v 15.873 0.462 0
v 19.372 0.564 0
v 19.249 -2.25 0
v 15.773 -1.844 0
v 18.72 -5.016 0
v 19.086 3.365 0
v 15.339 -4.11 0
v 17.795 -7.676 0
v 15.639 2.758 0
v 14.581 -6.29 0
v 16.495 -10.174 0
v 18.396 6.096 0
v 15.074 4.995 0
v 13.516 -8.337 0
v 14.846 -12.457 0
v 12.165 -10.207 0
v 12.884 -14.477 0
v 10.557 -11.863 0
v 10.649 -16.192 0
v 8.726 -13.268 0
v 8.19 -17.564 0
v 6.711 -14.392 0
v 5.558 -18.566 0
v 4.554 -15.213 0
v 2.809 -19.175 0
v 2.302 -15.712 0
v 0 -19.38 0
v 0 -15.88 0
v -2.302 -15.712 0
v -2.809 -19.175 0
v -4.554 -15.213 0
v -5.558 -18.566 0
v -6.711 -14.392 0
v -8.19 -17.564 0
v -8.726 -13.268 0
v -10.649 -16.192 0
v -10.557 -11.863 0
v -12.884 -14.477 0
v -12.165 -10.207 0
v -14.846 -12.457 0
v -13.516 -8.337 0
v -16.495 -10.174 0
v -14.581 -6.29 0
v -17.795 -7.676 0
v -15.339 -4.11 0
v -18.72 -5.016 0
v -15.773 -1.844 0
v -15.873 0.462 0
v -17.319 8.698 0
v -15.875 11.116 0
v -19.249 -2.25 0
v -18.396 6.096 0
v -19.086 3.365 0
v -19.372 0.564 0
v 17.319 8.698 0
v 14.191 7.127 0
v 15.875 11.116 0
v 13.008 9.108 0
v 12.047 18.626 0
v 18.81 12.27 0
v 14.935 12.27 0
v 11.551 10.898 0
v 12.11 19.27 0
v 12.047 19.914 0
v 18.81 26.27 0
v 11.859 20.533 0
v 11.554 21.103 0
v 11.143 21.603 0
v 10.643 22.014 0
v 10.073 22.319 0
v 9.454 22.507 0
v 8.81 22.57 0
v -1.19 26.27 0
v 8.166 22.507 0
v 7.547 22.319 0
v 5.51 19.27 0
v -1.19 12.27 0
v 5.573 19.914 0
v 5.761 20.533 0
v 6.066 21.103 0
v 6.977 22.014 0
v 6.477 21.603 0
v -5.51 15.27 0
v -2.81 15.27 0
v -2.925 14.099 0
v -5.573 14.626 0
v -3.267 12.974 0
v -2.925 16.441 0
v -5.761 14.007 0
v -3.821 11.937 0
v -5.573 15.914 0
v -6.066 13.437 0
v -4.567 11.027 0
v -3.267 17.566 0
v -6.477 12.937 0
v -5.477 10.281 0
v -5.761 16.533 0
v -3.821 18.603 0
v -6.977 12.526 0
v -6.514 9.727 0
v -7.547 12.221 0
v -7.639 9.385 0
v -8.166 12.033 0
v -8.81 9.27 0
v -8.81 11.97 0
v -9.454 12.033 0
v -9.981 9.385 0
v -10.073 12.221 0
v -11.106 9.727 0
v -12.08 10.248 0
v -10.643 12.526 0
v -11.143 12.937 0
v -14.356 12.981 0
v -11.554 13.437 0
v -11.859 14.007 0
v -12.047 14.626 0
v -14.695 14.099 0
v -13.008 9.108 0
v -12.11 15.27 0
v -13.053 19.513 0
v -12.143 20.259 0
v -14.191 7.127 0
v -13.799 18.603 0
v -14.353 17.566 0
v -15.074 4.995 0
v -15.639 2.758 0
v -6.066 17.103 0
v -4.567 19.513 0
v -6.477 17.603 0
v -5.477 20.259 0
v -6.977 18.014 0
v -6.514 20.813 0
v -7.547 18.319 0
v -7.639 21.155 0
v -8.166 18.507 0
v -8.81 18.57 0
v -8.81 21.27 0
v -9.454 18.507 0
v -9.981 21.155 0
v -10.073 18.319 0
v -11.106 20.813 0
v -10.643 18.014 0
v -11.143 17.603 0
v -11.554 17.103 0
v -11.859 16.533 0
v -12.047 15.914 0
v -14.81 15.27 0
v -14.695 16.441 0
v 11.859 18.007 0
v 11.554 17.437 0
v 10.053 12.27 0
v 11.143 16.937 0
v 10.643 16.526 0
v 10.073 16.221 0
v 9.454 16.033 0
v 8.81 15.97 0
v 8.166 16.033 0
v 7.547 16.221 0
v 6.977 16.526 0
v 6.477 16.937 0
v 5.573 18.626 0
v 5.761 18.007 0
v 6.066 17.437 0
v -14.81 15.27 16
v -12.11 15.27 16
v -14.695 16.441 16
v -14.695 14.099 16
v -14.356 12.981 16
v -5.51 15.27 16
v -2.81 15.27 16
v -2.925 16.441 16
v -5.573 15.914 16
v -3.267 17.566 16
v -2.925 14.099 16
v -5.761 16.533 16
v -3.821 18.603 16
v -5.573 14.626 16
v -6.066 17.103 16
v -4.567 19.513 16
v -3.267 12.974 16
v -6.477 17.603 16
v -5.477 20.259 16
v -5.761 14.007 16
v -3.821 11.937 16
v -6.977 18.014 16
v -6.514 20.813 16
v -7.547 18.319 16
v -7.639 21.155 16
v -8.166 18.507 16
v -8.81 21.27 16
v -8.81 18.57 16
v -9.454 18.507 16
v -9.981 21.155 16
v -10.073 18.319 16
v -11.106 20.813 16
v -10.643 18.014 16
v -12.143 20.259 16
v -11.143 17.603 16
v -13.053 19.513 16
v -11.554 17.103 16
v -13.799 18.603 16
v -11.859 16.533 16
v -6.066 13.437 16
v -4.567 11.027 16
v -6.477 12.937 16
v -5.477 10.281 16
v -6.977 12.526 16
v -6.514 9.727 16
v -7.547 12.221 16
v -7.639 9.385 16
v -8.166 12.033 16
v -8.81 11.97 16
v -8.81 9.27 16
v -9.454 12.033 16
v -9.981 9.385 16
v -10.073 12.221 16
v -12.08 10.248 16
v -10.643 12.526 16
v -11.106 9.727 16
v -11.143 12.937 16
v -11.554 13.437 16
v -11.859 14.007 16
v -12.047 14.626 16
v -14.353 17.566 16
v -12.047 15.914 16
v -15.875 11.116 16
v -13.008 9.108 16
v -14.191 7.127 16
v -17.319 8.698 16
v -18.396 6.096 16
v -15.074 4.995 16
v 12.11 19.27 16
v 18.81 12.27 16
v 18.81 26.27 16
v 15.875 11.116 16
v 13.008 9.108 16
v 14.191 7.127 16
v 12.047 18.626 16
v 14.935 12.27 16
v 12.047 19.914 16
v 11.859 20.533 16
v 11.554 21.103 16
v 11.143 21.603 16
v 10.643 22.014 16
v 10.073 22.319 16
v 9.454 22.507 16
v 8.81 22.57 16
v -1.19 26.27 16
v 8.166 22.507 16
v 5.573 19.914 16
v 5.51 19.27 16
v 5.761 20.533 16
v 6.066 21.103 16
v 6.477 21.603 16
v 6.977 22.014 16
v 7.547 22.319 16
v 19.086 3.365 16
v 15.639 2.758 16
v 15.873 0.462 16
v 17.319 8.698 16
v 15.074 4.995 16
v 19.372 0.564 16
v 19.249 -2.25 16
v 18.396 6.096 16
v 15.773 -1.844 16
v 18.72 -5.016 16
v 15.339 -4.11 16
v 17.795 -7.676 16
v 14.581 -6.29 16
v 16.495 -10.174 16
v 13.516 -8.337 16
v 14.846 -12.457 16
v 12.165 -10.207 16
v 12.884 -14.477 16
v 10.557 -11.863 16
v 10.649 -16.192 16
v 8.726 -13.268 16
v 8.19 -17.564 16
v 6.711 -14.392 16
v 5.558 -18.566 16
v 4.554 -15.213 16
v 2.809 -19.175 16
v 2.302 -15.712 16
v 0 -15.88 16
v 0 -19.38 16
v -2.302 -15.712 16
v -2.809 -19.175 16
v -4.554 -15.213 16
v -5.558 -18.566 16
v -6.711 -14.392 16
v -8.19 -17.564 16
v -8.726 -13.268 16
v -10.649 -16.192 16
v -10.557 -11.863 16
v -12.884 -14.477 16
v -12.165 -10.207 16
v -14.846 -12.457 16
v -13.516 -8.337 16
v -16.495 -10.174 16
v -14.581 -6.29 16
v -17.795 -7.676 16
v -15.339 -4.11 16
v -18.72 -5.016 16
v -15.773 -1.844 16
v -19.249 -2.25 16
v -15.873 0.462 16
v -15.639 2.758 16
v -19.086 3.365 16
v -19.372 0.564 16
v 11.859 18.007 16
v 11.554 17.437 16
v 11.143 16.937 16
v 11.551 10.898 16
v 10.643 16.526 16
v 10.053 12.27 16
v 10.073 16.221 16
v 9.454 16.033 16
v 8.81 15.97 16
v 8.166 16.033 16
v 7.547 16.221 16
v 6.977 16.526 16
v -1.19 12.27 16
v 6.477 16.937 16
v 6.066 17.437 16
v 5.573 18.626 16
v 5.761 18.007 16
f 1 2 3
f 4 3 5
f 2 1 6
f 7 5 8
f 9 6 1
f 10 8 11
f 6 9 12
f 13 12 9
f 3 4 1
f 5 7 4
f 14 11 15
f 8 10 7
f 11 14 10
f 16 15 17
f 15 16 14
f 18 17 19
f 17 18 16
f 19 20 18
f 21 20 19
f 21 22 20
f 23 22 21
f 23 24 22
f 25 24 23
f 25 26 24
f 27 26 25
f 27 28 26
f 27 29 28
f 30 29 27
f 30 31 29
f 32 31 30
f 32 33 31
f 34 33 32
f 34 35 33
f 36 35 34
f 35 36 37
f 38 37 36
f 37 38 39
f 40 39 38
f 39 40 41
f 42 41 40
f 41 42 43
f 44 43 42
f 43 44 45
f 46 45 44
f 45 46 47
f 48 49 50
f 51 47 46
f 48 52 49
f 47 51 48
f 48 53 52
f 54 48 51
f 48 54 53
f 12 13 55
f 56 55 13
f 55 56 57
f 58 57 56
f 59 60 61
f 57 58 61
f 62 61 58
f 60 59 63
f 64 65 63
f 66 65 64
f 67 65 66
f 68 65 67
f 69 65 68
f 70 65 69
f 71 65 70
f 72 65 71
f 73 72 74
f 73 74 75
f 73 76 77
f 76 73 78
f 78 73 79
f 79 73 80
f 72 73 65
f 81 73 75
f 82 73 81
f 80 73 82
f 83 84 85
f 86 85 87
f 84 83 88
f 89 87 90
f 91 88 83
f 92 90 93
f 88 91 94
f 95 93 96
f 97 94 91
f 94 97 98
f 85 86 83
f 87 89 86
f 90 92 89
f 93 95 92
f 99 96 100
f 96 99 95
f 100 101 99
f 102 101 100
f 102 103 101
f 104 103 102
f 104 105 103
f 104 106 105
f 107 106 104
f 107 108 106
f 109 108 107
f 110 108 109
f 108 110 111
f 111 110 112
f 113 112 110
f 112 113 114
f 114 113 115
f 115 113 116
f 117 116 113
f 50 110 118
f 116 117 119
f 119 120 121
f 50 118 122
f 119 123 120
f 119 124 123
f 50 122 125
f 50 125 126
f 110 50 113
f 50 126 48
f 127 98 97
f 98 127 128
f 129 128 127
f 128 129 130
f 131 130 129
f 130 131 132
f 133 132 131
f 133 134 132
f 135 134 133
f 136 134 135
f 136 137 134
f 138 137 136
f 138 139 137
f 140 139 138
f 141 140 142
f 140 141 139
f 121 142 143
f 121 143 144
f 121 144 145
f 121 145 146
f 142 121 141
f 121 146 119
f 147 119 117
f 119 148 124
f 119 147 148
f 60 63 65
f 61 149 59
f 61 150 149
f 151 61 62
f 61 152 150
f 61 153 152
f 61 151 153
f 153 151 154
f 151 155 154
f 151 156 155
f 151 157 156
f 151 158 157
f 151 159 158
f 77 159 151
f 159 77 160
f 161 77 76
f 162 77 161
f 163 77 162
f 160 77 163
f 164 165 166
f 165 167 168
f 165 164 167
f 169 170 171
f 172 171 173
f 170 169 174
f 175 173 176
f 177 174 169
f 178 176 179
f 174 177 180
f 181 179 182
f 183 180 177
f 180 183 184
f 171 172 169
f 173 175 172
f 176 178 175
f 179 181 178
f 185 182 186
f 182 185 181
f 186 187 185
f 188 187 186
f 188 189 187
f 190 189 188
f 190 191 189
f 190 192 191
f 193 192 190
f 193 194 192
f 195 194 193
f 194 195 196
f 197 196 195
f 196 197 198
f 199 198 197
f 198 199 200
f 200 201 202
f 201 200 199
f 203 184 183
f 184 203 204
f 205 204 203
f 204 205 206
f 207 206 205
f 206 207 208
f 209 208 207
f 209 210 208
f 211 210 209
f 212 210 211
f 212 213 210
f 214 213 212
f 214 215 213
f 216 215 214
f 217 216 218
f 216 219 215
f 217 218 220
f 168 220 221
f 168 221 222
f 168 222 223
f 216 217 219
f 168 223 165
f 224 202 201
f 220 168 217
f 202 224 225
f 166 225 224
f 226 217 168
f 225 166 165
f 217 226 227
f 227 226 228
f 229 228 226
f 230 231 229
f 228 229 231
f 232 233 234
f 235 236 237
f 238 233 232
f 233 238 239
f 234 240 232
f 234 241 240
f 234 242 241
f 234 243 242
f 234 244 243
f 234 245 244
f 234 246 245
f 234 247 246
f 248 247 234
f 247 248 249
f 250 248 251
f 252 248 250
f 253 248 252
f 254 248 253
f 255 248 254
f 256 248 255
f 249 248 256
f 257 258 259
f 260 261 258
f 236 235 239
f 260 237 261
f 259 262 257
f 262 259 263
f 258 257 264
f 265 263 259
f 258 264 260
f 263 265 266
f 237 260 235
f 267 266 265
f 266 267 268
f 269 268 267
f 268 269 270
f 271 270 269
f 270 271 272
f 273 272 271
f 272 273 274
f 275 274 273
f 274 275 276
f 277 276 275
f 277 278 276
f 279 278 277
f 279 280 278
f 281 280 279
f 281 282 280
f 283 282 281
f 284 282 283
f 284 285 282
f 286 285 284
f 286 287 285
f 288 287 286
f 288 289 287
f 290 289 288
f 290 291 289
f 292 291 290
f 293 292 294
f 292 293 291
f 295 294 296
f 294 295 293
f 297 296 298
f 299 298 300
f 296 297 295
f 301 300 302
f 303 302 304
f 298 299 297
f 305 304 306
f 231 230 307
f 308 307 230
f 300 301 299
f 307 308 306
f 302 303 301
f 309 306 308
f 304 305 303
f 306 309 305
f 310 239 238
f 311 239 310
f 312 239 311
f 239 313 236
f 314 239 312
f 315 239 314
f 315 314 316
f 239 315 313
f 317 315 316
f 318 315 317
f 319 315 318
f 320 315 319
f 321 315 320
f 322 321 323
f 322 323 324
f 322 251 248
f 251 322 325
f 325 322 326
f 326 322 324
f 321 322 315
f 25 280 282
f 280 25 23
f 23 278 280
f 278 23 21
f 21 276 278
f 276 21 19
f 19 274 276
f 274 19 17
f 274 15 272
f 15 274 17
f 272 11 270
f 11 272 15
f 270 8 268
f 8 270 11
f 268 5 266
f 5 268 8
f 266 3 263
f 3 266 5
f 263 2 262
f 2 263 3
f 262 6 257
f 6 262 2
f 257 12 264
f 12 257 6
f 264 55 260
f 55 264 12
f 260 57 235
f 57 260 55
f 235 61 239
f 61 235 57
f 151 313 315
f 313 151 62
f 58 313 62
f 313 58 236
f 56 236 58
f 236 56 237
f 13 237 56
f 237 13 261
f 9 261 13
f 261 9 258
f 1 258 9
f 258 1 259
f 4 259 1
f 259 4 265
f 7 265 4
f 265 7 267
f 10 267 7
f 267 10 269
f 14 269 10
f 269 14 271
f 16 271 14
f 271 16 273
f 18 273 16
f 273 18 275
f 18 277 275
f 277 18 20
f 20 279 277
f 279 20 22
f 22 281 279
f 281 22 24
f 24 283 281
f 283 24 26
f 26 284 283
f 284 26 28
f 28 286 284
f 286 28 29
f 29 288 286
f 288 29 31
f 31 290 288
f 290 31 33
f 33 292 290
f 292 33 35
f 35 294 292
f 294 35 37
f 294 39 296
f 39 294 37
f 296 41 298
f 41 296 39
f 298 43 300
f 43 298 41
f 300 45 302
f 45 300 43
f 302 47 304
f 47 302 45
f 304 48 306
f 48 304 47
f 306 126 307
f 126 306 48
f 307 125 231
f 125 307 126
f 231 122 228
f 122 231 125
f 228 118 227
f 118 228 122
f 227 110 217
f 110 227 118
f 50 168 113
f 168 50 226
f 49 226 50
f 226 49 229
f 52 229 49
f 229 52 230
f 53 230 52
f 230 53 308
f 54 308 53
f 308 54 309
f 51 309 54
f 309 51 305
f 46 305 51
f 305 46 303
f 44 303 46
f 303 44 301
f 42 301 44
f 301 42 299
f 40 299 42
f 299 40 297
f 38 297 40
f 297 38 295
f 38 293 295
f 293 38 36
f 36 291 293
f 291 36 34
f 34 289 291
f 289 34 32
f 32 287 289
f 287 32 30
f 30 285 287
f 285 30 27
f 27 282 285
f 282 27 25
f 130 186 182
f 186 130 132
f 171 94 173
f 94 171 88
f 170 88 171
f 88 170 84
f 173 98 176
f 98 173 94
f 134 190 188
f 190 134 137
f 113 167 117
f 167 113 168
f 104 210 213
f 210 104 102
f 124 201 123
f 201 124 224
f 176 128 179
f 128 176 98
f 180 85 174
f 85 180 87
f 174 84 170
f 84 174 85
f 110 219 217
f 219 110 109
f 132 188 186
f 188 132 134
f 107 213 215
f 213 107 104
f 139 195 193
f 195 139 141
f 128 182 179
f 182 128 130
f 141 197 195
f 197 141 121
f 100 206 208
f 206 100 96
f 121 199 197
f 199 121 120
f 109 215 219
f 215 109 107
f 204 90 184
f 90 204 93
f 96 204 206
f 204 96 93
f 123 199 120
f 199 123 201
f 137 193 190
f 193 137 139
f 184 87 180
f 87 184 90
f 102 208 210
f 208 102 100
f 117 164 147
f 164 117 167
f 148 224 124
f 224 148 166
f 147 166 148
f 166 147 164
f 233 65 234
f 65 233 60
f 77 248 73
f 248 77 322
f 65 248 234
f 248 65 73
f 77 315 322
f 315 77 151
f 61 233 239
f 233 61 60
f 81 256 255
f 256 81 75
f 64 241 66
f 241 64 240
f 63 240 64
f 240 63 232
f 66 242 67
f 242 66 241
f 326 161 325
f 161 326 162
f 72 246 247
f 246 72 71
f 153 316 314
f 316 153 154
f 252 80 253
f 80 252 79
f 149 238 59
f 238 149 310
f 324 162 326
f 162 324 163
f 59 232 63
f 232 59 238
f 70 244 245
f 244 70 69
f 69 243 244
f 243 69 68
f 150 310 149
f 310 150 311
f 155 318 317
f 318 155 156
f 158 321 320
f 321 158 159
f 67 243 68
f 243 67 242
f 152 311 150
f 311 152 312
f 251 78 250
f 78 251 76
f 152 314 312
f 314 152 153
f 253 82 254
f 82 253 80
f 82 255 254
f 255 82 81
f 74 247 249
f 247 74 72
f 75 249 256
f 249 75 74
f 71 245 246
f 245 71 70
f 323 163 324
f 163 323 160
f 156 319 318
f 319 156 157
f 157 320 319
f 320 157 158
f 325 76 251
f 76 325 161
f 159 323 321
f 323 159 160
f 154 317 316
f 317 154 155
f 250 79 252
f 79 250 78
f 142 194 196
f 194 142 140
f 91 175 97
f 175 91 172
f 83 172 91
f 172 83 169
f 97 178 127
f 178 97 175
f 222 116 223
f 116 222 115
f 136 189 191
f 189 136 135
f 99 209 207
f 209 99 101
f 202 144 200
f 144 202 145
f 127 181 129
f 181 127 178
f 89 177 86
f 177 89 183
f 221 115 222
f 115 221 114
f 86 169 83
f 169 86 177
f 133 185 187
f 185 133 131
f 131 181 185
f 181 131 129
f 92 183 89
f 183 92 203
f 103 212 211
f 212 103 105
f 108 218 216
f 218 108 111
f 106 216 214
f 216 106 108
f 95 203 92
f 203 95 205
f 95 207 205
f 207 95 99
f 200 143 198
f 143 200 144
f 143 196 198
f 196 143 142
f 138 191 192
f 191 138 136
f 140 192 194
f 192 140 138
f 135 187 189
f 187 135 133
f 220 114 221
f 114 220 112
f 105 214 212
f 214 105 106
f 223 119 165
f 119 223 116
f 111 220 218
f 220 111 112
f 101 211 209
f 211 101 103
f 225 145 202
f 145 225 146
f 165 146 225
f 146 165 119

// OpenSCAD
$fn = 32;

// ----------------------------------------------------------------------
// Pipe clamp: 38.76 mm ring, 3.5 mm wall, 16 mm wide
// ----------------------------------------------------------------------

// --- parameters (mm) ---
outer_r = 19.38;          // clamp outside radius
inner_r = 15.88;          // pipe bore radius
band = 3.5;               // band thickness
clamp_w = 16;             // clamp width
opening = 60;             // opening angle between the ends
lug_w = 20;               // lug width
lug_len = 14;             // lug length
bolt_d = 6.6;             // bolt hole
knuckle_d = 12;           // hinge knuckle diameter
pin_d = 6.6;              // hinge pin hole

clamp_profile = [[-9.69, 16.784], [-12.02, 15.202], [-14.097, 13.299], [-15.875, 11.116], [-17.319, 8.698], [-18.396, 6.096], [-19.086, 3.365], [-19.372, 0.564], [-19.249, -2.25], [-18.72, -5.016], [-17.795, -7.676], [-16.495, -10.174], [-14.846, -12.457], [-12.884, -14.477], [-10.649, -16.192], [-8.19, -17.564], [-5.558, -18.566], [-2.809, -19.175], [0, -19.38], [2.809, -19.175], [5.558, -18.566], [8.19, -17.564], [10.649, -16.192], [12.884, -14.477], [14.846, -12.457], [16.495, -10.174], [17.795, -7.676], [18.72, -5.016], [19.249, -2.25], [19.372, 0.564], [19.086, 3.365], [18.396, 6.096], [17.319, 8.698], [15.875, 11.116], [14.097, 13.299], [12.02, 15.202], [9.69, 16.784], [7.94, 13.752], [9.849, 12.457], [11.551, 10.898], [13.008, 9.108], [14.191, 7.127], [15.074, 4.995], [15.639, 2.758], [15.873, 0.462], [15.773, -1.844], [15.339, -4.11], [14.581, -6.29], [13.516, -8.337], [12.165, -10.207], [10.557, -11.863], [8.726, -13.268], [6.711, -14.392], [4.554, -15.213], [2.302, -15.712], [0, -15.88], [-2.302, -15.712], [-4.554, -15.213], [-6.711, -14.392], [-8.726, -13.268], [-10.557, -11.863], [-12.165, -10.207], [-13.516, -8.337], [-14.581, -6.29], [-15.339, -4.11], [-15.773, -1.844], [-15.873, 0.462], [-15.639, 2.758], [-15.074, 4.995], [-14.191, 7.127], [-13.008, 9.108], [-11.551, 10.898], [-9.849, 12.457], [-7.94, 13.752]];

difference() {
  union() {
    linear_extrude(height = clamp_w) polygon(clamp_profile);
    /* hinge knuckle, sunk 2 mm into the band end */
    translate([-8.81, 15.27, 0]) cylinder(h = clamp_w, d = knuckle_d);
    /* bolt lug on the other end */
    translate([-1.19, 12.27, 0]) cube([lug_w, 14, clamp_w]);
  }
  translate([8.81, 19.27, -2.5]) cylinder(h = clamp_w + 5, d = bolt_d);
  translate([-8.81, 15.27, -2.5]) cylinder(h = clamp_w + 5, d = pin_d);
}
